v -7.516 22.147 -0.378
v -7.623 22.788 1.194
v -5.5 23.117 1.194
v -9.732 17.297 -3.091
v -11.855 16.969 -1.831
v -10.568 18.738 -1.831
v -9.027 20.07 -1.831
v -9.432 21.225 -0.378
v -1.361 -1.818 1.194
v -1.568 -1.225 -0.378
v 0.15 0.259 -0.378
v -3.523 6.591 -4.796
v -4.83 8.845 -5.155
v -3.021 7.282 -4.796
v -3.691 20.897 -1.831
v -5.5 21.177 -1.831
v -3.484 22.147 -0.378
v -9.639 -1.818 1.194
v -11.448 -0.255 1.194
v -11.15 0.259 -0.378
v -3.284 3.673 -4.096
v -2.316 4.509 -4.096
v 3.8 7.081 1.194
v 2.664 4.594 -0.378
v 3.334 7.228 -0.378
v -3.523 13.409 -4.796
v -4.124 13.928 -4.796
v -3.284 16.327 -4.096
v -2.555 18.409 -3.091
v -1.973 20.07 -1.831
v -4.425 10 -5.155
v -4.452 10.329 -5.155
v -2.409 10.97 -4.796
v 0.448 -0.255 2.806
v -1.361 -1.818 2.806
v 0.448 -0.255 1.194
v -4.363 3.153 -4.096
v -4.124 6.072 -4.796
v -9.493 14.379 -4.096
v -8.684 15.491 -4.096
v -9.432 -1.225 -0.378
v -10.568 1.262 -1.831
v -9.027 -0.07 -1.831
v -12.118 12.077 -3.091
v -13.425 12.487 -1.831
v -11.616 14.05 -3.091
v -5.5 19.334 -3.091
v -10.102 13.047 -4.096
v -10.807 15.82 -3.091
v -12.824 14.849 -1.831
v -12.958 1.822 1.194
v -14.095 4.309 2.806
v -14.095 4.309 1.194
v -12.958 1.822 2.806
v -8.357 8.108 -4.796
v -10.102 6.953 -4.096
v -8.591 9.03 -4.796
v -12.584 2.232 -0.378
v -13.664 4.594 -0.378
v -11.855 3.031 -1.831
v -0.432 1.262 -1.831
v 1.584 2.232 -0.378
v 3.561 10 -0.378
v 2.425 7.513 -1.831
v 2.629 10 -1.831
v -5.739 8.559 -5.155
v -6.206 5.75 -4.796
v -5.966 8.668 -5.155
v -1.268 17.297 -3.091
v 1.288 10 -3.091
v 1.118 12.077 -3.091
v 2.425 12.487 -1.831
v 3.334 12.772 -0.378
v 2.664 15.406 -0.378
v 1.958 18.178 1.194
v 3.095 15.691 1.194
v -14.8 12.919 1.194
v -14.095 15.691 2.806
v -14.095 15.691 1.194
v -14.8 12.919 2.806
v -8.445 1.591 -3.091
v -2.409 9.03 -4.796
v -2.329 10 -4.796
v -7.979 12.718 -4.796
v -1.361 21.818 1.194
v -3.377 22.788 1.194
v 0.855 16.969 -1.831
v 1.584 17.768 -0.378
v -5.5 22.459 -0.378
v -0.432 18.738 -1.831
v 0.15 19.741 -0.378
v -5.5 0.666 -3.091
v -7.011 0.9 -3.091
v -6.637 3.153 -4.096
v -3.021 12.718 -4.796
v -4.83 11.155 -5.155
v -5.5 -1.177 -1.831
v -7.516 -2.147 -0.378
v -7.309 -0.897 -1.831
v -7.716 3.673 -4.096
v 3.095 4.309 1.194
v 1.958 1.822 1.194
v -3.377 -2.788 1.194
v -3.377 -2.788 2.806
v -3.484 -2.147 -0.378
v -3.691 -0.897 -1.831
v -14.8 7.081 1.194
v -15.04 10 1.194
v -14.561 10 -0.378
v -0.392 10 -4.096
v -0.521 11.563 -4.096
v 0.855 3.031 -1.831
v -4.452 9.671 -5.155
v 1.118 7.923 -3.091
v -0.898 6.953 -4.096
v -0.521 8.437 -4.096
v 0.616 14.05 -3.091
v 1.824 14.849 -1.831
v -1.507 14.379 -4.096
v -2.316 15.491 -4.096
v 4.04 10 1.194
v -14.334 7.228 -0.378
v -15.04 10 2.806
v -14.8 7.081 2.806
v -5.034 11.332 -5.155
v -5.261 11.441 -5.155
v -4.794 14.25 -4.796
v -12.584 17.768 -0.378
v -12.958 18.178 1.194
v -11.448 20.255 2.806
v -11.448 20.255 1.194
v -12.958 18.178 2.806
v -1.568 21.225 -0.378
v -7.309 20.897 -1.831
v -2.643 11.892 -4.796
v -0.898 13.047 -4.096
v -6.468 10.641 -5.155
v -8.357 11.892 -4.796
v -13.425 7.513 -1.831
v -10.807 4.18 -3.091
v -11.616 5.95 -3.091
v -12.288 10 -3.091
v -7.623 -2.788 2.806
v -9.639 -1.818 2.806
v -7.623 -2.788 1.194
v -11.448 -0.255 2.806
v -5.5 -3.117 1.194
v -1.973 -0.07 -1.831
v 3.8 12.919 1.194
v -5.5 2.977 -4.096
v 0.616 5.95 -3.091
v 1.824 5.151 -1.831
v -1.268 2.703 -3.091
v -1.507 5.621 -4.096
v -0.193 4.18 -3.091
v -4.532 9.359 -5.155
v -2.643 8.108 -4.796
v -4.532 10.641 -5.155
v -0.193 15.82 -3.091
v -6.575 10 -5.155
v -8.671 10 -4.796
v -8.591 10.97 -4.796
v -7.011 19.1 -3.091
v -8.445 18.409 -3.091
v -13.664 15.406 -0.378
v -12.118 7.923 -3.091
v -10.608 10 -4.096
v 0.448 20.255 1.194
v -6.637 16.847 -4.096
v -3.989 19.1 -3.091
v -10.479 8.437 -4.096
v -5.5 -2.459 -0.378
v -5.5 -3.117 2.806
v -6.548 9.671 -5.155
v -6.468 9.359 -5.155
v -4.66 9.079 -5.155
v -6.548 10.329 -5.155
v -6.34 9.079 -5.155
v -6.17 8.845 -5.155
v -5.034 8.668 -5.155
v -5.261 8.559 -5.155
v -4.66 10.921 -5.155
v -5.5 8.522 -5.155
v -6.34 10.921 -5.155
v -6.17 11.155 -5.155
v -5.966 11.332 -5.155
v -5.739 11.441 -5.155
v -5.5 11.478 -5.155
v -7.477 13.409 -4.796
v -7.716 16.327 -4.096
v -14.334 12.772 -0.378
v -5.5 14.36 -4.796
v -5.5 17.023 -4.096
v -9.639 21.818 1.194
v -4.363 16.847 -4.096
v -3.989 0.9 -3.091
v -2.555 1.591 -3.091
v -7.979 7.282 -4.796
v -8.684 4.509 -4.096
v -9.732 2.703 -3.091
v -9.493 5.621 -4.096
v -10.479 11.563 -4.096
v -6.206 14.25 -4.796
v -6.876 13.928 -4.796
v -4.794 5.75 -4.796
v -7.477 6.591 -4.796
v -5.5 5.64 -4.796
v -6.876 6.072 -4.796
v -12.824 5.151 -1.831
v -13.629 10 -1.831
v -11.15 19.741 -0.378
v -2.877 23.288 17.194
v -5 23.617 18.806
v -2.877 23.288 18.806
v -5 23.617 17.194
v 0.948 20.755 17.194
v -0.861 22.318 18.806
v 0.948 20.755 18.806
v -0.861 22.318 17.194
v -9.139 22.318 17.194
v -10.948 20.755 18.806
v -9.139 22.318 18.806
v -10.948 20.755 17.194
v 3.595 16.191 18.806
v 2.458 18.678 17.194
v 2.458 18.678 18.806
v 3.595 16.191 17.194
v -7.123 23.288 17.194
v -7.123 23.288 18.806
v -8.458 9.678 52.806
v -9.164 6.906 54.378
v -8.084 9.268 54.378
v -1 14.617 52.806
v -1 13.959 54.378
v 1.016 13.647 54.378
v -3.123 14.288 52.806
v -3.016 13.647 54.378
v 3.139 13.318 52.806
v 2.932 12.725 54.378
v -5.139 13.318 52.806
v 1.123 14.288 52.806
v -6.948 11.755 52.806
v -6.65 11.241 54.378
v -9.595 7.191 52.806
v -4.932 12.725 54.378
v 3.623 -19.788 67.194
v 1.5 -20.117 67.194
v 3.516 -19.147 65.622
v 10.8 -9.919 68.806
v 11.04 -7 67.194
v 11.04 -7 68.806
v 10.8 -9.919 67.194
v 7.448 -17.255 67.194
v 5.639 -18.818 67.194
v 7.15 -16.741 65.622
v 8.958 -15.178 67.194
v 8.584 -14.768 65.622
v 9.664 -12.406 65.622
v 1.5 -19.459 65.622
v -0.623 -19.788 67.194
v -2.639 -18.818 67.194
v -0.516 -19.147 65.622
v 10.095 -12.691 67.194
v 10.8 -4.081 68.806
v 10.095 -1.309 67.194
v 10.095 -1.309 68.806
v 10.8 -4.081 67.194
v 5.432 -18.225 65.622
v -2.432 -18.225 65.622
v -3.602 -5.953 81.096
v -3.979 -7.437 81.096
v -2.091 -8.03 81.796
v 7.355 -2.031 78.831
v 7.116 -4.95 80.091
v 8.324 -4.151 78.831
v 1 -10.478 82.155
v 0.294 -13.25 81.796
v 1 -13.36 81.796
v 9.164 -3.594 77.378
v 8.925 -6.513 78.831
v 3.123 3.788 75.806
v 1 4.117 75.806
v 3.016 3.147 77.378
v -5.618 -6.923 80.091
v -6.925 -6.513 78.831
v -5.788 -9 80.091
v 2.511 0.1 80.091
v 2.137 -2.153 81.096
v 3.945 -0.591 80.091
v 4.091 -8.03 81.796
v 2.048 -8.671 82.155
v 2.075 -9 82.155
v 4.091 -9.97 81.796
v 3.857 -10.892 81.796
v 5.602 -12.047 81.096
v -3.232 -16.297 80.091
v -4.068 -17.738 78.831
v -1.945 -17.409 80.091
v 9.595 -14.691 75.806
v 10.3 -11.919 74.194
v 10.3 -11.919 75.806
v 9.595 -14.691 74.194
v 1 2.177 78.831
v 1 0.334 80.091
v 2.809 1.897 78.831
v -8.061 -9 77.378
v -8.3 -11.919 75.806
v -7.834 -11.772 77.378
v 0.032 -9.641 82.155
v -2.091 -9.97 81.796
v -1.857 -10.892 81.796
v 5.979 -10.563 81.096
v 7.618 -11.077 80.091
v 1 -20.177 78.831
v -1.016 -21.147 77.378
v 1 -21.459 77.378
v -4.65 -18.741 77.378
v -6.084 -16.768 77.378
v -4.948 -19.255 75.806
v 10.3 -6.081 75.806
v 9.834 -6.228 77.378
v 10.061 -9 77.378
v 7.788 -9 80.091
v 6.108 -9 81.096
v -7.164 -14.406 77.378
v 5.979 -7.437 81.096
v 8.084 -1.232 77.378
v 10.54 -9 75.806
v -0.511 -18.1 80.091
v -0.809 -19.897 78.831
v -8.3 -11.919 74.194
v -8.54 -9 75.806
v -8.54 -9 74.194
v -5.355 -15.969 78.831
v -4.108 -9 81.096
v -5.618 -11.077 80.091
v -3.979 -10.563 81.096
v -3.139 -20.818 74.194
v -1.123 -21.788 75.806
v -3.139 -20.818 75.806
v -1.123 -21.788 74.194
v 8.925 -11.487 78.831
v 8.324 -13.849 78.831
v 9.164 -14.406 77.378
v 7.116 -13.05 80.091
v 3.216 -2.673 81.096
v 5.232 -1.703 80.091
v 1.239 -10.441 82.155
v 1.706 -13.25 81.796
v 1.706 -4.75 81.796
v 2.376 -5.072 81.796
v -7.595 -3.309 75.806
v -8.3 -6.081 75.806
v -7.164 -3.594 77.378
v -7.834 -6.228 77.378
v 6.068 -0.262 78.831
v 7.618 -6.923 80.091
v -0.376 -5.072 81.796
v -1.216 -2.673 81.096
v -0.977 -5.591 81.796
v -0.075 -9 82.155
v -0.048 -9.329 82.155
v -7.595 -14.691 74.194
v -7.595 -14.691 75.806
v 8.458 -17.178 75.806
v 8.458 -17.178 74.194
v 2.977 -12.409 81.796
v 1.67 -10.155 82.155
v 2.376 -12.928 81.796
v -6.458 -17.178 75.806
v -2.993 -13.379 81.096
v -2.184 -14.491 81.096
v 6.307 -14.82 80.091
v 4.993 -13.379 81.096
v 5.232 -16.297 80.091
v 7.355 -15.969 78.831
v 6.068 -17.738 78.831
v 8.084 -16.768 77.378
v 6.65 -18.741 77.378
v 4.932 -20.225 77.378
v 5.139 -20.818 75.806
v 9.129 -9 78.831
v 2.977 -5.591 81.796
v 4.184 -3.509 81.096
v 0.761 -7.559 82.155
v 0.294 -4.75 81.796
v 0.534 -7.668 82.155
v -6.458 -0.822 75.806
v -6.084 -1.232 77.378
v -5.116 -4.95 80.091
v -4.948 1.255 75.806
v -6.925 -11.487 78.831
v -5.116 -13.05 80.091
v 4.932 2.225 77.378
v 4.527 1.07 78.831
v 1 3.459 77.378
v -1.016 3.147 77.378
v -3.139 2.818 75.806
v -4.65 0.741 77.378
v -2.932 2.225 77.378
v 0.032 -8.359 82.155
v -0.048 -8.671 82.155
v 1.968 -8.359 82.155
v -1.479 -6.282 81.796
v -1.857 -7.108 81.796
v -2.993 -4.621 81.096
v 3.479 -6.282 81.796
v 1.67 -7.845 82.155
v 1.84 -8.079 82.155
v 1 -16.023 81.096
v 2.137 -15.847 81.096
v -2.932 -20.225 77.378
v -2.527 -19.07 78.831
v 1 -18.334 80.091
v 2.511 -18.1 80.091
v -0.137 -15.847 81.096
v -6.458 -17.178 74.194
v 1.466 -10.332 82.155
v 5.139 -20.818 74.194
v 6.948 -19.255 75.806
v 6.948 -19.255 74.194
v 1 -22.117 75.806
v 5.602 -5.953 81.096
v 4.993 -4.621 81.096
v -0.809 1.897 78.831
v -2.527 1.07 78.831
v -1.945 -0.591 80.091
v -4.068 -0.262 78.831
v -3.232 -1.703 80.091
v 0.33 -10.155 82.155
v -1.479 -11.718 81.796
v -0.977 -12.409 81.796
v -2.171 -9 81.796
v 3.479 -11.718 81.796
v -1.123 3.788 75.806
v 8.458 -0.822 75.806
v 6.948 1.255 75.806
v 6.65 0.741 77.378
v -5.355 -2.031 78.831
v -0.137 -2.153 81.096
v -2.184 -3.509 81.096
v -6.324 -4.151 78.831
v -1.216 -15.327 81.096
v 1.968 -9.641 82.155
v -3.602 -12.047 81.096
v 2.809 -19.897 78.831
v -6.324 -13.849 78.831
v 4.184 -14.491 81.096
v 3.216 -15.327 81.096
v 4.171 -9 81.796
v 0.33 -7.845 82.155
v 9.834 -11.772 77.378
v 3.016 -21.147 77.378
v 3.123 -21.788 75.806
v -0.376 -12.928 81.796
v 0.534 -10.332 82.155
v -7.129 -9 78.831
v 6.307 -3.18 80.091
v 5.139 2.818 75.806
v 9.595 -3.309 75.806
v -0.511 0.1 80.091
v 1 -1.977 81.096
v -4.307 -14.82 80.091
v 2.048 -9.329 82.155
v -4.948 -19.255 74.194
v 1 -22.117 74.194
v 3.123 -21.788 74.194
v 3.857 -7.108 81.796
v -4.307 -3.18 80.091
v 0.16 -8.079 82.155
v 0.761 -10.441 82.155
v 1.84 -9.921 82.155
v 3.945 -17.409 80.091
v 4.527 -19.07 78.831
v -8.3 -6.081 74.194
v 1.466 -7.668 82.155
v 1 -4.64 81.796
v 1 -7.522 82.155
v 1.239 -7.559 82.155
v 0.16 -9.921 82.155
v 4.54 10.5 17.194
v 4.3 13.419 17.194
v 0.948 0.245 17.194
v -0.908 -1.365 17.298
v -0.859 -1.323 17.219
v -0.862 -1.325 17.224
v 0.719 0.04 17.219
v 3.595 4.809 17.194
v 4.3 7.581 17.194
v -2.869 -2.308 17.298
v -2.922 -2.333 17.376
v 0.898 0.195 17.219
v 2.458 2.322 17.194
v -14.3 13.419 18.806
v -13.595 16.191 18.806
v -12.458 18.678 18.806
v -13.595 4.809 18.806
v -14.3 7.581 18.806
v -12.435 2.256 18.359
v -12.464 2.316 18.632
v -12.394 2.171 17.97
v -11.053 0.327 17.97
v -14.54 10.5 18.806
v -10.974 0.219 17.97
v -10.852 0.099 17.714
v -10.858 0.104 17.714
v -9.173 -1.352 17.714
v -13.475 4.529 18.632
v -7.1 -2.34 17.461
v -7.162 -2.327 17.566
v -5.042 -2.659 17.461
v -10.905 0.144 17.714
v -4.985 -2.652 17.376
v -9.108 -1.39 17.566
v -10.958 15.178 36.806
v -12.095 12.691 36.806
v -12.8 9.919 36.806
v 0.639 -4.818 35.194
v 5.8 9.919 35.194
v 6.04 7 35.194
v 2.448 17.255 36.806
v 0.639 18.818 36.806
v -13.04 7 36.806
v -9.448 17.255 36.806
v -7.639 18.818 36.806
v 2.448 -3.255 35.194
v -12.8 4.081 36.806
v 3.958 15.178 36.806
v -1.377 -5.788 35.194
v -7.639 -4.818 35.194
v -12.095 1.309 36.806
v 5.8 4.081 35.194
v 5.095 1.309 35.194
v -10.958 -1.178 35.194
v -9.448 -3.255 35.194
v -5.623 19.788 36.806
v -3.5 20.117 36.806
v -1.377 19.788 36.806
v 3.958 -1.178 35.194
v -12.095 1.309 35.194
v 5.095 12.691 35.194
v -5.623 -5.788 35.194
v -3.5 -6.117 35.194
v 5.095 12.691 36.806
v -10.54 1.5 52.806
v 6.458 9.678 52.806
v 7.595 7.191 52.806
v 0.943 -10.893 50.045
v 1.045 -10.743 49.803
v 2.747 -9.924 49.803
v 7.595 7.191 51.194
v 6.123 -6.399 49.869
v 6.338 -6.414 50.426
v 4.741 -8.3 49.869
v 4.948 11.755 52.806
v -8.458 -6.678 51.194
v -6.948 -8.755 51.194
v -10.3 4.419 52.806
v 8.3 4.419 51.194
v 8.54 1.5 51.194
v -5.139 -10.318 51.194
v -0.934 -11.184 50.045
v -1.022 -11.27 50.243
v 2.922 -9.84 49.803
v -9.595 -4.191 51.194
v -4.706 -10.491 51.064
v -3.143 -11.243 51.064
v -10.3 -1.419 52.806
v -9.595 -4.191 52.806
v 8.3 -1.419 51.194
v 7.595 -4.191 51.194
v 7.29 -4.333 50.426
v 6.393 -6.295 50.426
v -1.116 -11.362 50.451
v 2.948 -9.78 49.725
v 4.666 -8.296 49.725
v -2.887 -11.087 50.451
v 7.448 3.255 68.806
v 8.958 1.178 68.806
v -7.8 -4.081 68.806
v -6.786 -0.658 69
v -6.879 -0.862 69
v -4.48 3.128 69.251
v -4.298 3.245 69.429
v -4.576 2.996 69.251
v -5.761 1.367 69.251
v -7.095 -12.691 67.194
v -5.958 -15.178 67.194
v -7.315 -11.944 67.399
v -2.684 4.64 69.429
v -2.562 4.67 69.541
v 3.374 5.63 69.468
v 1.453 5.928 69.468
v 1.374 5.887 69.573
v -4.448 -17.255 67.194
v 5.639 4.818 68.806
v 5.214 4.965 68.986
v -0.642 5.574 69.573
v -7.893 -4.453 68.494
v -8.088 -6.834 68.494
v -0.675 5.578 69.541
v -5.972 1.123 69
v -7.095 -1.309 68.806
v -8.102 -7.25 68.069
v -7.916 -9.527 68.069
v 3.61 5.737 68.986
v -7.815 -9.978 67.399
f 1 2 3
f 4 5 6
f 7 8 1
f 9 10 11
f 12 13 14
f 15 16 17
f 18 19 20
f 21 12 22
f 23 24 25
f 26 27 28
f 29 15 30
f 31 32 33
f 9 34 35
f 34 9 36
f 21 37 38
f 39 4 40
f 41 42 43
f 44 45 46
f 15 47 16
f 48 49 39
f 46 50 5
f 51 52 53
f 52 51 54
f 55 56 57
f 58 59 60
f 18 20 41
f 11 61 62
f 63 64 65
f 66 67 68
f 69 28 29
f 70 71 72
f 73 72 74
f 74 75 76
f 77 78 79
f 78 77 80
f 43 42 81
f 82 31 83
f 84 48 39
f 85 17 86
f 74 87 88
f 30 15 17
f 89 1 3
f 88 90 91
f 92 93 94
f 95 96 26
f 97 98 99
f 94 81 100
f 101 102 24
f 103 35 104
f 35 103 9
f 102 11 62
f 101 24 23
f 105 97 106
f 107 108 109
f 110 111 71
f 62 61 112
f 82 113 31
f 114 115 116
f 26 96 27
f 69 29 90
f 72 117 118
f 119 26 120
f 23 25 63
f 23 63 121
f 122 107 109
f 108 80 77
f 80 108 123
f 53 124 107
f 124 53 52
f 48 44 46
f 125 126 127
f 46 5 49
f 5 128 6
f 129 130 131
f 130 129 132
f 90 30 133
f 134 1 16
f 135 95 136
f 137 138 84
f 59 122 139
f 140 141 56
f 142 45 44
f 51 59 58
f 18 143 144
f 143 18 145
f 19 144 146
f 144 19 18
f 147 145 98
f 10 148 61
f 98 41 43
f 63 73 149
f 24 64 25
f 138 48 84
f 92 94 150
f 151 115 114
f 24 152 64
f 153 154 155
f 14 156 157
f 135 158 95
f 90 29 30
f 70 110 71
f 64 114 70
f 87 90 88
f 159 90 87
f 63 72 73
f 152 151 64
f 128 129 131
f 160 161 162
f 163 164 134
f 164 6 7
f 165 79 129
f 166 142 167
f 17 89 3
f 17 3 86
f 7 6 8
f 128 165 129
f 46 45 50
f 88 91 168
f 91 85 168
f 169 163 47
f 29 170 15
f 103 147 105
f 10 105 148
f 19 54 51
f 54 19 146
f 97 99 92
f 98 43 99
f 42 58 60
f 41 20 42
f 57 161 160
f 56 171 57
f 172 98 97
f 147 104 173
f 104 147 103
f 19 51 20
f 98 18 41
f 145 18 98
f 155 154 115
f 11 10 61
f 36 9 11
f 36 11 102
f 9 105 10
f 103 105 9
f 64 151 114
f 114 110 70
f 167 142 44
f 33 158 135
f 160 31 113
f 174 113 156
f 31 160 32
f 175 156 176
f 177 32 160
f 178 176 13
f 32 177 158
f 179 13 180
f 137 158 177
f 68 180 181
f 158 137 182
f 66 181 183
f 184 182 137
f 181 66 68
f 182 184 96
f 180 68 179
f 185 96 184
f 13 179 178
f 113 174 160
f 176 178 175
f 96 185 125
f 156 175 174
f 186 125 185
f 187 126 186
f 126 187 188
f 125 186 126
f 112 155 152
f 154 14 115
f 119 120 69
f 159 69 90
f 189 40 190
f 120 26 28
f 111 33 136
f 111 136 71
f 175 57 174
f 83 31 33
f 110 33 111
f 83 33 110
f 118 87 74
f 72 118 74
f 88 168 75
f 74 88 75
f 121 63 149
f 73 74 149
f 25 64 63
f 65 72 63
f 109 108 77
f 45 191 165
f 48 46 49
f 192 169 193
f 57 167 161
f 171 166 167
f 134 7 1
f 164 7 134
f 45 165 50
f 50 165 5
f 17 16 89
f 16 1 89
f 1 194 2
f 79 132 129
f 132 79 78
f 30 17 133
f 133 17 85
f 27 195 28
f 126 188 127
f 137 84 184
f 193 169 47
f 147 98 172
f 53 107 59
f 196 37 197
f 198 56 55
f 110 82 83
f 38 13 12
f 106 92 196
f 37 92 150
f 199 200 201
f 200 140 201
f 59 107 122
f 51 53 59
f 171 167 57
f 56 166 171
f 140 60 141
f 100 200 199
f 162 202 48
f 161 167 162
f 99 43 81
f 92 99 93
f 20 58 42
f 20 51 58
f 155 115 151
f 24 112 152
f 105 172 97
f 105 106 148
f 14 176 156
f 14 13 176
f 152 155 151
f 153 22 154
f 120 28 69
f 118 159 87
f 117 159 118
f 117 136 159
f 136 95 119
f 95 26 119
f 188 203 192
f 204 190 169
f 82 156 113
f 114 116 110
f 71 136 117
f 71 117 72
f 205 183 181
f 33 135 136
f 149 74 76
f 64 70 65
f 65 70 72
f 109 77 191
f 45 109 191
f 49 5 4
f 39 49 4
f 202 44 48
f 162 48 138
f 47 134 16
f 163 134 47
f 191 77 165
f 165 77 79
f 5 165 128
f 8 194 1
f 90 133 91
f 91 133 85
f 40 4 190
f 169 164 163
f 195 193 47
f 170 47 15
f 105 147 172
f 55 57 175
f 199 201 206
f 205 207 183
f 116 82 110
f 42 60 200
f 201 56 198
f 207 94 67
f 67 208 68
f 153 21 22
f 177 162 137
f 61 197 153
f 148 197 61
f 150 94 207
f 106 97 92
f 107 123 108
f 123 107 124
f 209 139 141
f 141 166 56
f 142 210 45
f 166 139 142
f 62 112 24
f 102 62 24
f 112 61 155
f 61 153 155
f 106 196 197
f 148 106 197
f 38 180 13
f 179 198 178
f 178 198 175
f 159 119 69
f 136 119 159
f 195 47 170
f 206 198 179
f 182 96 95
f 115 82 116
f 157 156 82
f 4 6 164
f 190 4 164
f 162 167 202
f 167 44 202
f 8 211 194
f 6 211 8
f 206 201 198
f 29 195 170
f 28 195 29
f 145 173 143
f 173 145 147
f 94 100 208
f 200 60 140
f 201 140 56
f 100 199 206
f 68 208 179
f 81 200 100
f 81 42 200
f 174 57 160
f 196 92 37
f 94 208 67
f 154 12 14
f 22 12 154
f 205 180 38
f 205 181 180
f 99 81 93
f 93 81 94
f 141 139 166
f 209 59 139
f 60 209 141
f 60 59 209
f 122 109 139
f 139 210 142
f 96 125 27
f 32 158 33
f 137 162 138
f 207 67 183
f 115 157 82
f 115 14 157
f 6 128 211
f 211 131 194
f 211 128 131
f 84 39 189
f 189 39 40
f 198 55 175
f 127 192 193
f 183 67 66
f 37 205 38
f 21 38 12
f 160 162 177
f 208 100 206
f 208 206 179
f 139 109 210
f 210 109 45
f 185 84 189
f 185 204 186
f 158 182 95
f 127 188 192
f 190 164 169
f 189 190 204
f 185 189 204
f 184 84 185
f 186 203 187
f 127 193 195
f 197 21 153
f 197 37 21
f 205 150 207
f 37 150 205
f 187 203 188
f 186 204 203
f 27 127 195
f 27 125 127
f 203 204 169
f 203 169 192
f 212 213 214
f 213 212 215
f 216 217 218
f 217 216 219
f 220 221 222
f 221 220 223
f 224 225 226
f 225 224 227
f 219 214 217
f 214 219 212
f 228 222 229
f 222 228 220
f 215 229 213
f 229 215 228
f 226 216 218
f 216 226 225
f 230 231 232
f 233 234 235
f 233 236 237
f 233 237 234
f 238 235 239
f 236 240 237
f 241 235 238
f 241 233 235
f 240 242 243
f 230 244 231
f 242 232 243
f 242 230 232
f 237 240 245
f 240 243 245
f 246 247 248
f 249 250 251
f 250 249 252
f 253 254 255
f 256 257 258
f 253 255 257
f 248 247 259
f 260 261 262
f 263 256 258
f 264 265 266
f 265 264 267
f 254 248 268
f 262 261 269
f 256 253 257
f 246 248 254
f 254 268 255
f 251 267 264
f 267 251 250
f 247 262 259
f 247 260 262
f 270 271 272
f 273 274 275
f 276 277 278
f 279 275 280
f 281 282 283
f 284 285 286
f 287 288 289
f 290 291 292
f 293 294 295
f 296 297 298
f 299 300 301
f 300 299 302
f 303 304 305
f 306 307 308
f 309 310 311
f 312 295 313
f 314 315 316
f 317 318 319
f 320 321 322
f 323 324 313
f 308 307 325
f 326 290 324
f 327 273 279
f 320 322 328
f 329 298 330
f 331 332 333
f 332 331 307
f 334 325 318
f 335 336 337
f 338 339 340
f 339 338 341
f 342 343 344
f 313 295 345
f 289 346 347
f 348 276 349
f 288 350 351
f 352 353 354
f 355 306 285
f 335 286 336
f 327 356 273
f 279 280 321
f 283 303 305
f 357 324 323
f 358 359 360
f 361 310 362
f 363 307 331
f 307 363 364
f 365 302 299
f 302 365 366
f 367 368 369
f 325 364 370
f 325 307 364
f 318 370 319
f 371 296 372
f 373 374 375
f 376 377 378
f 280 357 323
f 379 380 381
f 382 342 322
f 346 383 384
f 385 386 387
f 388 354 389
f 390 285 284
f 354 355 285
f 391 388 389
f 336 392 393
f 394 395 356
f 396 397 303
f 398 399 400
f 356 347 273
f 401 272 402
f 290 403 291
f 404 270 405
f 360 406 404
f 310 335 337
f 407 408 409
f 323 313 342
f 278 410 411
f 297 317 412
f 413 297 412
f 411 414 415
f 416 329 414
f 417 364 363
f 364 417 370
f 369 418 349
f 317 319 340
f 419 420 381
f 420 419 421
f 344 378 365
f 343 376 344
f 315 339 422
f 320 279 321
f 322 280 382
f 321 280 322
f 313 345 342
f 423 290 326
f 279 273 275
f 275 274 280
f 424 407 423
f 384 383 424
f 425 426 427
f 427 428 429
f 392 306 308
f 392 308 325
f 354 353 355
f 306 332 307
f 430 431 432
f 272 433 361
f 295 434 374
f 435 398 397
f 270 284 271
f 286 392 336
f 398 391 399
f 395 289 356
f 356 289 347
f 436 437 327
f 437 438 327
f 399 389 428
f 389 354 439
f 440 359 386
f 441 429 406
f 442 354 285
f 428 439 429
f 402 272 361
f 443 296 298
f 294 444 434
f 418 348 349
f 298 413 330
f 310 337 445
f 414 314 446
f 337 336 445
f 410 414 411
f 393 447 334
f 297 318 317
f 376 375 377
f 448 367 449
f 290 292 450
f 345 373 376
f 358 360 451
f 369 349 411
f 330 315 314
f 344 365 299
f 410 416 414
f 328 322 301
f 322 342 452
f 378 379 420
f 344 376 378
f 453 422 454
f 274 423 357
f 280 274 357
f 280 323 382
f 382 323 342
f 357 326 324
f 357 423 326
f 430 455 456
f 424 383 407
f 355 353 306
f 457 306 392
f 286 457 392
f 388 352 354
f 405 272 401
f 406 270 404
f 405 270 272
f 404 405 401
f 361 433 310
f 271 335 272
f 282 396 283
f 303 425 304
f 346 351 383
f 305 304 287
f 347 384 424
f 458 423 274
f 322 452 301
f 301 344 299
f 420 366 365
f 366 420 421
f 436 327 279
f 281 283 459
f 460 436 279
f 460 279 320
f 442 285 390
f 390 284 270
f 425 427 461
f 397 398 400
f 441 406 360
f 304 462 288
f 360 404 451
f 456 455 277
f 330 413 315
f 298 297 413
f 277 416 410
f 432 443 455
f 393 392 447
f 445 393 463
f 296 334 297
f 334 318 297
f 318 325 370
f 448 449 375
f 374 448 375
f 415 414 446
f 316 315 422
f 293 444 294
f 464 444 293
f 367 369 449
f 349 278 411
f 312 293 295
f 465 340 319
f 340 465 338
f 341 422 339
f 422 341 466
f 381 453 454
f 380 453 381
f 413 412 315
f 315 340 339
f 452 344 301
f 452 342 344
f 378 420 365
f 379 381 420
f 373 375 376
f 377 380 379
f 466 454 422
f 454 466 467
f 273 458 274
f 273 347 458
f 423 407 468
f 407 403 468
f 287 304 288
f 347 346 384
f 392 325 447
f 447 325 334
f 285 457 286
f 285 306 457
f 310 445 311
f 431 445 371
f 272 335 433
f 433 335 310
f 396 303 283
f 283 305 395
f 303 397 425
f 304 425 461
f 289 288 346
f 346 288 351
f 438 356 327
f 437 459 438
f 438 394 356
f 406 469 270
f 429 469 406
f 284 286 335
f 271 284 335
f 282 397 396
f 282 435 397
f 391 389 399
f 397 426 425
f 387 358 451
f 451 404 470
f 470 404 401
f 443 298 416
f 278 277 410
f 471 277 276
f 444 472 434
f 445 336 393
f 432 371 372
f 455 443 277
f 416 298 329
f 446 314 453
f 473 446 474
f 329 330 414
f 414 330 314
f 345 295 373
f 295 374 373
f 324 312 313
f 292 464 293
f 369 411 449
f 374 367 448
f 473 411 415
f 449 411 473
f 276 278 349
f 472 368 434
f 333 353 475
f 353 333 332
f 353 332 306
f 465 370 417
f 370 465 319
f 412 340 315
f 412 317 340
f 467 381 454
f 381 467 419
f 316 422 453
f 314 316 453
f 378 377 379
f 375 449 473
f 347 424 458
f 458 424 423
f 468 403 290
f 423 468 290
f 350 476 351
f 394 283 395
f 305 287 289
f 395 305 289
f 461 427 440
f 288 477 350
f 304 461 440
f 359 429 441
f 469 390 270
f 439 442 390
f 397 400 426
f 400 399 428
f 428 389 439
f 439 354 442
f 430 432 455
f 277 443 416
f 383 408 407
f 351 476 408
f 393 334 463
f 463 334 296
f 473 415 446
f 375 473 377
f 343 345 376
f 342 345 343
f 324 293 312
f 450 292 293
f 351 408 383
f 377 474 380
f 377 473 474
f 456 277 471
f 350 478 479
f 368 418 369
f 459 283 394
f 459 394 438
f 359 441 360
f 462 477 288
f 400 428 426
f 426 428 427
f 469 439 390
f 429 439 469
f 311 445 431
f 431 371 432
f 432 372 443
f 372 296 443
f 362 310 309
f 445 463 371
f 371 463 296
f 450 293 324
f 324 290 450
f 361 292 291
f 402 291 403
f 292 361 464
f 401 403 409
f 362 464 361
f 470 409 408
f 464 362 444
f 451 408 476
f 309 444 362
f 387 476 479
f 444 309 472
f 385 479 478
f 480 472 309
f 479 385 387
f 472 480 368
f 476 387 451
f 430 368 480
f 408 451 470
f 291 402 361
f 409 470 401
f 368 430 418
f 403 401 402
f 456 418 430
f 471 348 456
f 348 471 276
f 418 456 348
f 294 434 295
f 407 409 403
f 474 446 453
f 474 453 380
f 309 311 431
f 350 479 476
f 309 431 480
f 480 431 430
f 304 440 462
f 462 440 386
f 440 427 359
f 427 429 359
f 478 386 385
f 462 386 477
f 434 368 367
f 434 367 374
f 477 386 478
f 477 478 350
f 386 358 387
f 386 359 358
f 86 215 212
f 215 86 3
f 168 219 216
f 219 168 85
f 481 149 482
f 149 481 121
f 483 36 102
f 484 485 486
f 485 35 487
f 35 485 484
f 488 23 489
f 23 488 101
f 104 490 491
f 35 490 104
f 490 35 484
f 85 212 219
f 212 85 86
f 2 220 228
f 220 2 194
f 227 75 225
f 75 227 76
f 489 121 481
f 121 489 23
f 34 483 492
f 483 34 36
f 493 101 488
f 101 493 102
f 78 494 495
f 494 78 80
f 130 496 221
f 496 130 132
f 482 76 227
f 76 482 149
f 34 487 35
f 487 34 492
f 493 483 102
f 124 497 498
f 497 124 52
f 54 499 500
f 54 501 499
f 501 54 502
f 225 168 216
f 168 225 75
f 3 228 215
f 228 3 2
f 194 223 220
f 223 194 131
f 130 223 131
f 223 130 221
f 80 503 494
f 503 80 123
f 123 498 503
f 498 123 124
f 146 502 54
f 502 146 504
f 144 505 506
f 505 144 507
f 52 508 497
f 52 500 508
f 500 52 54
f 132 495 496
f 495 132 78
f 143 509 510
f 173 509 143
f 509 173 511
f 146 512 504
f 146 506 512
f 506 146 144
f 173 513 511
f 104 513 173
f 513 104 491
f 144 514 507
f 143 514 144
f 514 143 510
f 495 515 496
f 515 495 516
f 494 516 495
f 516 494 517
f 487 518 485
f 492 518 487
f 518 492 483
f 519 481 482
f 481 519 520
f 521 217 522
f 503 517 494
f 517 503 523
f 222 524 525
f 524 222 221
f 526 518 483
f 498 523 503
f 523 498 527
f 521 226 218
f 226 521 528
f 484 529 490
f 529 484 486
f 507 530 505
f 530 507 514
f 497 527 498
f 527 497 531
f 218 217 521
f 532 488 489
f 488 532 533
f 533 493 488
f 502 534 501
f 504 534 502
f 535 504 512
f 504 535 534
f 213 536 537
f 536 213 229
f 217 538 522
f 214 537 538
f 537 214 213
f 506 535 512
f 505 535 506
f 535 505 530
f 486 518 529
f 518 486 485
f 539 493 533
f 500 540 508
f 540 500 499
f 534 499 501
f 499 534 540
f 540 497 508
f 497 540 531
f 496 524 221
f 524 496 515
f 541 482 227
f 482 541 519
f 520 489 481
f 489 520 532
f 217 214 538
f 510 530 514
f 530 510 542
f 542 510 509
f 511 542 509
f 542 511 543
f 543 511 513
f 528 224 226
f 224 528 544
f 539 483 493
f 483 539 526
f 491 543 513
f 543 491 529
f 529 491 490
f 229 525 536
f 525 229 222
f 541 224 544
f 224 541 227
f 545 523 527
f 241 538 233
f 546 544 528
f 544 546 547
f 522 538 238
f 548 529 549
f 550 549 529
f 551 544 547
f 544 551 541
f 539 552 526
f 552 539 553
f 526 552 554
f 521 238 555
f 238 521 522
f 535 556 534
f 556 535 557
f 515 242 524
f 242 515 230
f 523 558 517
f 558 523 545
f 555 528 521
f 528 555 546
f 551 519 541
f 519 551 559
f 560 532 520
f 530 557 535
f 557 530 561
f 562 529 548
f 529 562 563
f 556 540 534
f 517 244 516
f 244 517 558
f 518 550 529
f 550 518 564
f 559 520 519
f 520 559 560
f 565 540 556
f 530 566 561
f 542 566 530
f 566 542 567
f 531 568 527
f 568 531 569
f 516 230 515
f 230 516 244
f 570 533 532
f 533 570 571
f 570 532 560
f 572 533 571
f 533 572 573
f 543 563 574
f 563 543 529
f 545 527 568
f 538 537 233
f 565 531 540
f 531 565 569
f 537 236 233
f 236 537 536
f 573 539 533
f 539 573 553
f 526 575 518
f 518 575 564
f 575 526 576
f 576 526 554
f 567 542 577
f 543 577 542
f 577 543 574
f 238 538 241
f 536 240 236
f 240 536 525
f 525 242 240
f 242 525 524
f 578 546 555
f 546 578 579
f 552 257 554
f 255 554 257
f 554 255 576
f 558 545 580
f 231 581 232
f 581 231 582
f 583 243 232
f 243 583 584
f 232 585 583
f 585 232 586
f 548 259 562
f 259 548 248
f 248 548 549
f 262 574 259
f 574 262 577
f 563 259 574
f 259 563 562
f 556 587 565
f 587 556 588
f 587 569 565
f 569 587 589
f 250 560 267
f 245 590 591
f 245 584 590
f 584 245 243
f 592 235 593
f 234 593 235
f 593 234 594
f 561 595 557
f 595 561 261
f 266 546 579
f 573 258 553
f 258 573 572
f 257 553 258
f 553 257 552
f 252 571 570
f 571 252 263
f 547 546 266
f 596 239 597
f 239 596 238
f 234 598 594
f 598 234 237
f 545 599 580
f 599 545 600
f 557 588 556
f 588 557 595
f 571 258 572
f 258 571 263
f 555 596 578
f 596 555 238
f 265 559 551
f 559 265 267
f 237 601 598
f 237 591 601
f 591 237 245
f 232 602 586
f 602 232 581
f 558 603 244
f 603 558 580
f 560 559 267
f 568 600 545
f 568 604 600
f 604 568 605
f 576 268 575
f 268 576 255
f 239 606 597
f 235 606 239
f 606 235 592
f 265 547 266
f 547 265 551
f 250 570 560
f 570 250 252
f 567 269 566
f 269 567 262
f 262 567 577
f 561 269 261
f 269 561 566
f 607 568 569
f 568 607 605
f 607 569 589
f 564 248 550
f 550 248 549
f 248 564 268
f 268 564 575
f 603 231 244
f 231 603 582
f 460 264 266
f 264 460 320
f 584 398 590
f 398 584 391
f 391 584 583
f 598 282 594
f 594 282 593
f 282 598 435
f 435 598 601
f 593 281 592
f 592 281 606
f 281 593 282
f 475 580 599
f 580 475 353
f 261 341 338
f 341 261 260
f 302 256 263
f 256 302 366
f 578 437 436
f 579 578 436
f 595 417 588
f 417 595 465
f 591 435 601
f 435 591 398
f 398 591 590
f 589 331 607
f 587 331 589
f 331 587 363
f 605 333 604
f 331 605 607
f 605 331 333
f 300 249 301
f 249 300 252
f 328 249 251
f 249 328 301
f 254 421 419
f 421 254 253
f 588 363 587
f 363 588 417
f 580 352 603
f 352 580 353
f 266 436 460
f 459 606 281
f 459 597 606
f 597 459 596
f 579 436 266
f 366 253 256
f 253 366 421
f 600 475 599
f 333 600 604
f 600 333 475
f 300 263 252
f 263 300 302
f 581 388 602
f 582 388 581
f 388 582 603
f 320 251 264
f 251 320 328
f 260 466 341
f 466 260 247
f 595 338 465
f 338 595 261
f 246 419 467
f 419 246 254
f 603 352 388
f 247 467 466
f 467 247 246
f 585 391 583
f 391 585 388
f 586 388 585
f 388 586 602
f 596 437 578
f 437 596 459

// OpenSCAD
$fn=28;
MASTER="Camera_Right_Grip_MASTER_98mm.stl";
module ellipsoid(c, r) { translate(c) scale(r) sphere(1); }
module keepout(){
  ellipsoid([-5.5000,10.0000,2.0000], [9.6000,13.2000,7.2000]);
  ellipsoid([-5.0000,10.5000,18.0000], [9.6000,13.2000,7.2000]);
  ellipsoid([-3.5000,7.0000,36.0000], [9.6000,13.2000,7.2000]);
  ellipsoid([-1.0000,1.5000,52.0000], [9.6000,13.2000,7.2000]);
  ellipsoid([1.5000,-7.0000,68.0000], [9.6000,13.2000,7.2000]);
  ellipsoid([1.0000,-9.0000,75.0000], [9.6000,13.2000,7.2000]);
  hull() { ellipsoid([-5.5000,10.0000,2.0000], [9.6000,13.2000,7.2000]); ellipsoid([-5.0000,10.5000,18.0000], [9.6000,13.2000,7.2000]); }
  hull() { ellipsoid([-5.0000,10.5000,18.0000], [9.6000,13.2000,7.2000]); ellipsoid([-3.5000,7.0000,36.0000], [9.6000,13.2000,7.2000]); }
  hull() { ellipsoid([-3.5000,7.0000,36.0000], [9.6000,13.2000,7.2000]); ellipsoid([-1.0000,1.5000,52.0000], [9.6000,13.2000,7.2000]); }
  hull() { ellipsoid([-1.0000,1.5000,52.0000], [9.6000,13.2000,7.2000]); ellipsoid([1.5000,-7.0000,68.0000], [9.6000,13.2000,7.2000]); }
  hull() { ellipsoid([1.5000,-7.0000,68.0000], [9.6000,13.2000,7.2000]); ellipsoid([1.0000,-9.0000,75.0000], [9.6000,13.2000,7.2000]); }
}
keepout();
